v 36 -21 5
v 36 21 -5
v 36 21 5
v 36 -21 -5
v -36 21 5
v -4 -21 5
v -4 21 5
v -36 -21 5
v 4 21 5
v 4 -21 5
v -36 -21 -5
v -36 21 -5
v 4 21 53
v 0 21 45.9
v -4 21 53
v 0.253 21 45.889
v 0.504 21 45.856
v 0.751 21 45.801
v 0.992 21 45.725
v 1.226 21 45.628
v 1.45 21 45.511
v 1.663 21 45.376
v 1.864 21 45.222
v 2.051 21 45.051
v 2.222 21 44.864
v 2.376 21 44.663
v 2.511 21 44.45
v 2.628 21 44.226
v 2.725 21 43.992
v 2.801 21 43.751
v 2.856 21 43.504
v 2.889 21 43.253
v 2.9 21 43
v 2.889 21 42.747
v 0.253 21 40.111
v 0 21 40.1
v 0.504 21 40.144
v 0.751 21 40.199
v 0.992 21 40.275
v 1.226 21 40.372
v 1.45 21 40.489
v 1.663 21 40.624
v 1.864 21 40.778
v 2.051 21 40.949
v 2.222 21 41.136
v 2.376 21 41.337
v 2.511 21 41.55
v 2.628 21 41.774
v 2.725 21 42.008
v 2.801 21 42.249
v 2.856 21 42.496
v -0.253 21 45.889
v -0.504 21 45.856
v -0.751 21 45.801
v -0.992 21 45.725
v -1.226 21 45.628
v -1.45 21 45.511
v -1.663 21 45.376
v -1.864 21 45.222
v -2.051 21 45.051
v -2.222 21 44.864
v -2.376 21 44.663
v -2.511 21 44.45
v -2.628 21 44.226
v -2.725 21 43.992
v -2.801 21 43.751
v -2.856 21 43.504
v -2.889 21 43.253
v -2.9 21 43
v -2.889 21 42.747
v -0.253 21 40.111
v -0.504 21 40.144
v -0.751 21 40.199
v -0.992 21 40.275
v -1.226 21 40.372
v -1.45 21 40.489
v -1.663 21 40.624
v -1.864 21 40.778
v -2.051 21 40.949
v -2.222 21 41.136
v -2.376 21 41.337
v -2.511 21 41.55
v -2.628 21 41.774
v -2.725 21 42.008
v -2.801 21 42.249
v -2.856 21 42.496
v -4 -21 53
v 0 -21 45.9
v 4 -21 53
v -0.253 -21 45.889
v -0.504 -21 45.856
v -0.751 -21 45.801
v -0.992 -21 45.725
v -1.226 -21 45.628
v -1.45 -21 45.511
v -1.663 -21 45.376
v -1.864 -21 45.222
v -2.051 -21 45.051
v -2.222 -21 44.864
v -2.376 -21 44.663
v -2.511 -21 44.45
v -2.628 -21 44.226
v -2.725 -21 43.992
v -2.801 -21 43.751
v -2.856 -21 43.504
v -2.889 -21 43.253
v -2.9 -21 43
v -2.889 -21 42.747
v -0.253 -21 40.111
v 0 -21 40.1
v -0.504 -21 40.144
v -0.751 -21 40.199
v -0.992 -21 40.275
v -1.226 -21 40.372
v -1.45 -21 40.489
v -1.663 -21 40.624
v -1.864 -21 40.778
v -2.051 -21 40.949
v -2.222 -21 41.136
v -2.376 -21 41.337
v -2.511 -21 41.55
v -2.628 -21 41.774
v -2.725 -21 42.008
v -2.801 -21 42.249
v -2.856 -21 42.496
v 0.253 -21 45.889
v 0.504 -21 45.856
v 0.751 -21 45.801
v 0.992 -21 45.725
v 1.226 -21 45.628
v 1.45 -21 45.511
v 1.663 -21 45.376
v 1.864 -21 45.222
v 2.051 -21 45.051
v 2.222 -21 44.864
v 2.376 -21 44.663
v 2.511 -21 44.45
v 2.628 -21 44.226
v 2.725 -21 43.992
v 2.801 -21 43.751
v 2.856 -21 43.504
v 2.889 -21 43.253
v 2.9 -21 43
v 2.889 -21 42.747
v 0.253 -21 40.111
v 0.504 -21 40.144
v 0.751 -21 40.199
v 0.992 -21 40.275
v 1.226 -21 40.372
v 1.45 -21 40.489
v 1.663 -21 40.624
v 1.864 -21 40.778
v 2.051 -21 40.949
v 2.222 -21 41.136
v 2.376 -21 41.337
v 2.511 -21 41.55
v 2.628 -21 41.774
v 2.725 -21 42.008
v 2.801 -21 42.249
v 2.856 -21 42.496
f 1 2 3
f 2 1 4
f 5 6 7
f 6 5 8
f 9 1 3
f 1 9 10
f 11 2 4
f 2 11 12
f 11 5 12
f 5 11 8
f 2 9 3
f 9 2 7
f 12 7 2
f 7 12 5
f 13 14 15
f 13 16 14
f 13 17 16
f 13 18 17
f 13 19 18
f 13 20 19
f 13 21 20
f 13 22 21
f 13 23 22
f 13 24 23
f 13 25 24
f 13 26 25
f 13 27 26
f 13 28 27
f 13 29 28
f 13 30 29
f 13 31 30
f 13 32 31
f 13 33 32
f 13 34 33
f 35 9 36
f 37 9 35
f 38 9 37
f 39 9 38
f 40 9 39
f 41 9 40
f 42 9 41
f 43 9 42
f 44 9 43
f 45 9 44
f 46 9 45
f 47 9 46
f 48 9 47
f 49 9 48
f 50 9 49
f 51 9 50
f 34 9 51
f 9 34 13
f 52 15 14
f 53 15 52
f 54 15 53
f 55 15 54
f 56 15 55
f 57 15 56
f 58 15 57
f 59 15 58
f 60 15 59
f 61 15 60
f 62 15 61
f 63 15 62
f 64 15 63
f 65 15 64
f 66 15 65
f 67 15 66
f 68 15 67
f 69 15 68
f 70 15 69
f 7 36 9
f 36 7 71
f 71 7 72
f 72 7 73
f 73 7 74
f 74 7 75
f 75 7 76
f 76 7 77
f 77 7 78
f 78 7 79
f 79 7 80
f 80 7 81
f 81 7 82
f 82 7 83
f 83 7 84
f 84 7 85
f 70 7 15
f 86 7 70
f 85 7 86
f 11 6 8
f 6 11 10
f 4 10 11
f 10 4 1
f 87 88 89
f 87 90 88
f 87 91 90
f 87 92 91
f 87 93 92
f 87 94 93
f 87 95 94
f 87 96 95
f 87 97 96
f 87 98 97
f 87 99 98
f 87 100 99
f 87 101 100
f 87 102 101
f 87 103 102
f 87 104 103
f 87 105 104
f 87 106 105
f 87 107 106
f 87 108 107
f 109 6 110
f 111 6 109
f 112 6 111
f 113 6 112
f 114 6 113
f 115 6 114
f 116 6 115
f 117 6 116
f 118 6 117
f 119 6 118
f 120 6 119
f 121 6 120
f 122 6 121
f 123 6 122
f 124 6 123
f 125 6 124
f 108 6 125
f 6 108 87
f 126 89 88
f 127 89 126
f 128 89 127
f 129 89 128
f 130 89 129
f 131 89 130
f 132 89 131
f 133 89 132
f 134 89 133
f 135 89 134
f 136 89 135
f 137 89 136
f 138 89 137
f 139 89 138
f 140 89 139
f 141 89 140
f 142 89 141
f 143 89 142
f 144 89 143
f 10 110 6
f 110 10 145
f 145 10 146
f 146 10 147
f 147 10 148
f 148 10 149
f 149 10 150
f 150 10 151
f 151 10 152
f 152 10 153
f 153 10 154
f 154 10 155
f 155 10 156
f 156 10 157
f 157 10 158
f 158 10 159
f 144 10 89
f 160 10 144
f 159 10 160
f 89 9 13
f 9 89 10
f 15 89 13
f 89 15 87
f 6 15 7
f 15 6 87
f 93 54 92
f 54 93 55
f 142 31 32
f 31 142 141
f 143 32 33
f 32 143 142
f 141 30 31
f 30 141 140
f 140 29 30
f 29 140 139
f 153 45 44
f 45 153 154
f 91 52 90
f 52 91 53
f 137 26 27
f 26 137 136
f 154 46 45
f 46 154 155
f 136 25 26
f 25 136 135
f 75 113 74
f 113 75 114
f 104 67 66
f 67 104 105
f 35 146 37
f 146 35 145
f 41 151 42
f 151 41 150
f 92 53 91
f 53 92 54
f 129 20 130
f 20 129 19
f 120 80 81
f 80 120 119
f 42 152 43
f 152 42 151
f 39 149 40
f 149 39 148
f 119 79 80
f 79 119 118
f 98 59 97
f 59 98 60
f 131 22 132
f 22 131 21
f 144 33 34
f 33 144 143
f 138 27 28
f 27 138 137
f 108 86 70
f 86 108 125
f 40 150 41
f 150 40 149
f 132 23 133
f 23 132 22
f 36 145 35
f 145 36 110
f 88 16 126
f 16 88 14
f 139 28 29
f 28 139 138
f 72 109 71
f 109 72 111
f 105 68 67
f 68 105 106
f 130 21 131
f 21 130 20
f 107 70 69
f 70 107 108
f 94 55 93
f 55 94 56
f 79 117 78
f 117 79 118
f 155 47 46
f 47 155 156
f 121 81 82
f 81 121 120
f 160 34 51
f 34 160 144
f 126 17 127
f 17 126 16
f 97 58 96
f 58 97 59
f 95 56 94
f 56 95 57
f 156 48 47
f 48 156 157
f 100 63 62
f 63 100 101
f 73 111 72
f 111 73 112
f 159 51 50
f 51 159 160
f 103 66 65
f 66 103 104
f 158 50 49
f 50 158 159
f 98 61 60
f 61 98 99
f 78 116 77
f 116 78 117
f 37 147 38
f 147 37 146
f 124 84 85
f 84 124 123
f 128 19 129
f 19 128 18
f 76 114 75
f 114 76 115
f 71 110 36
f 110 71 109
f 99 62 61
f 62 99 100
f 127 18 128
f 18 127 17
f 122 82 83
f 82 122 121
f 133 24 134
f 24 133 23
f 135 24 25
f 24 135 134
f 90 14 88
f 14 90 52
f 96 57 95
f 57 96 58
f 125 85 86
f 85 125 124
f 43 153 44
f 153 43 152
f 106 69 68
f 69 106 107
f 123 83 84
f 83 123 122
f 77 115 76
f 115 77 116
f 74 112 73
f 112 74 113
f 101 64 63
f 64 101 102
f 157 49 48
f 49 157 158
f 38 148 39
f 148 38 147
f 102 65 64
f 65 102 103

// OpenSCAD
// TS-PET-C11 - Wheel Station Base
$fn = 72; base_w=72; base_d=42; base_h=10; upright_h=48; upright_t=8; axle_d=5.8;
difference(){ union(){ cube([base_w,base_d,base_h], center=true); translate([0,0,base_h/2+upright_h/2]) cube([upright_t,base_d, upright_h], center=true);} translate([0,0,base_h/2+upright_h-10]) rotate([90,0,0]) cylinder(h=base_d+2,d=axle_d,center=true); }
